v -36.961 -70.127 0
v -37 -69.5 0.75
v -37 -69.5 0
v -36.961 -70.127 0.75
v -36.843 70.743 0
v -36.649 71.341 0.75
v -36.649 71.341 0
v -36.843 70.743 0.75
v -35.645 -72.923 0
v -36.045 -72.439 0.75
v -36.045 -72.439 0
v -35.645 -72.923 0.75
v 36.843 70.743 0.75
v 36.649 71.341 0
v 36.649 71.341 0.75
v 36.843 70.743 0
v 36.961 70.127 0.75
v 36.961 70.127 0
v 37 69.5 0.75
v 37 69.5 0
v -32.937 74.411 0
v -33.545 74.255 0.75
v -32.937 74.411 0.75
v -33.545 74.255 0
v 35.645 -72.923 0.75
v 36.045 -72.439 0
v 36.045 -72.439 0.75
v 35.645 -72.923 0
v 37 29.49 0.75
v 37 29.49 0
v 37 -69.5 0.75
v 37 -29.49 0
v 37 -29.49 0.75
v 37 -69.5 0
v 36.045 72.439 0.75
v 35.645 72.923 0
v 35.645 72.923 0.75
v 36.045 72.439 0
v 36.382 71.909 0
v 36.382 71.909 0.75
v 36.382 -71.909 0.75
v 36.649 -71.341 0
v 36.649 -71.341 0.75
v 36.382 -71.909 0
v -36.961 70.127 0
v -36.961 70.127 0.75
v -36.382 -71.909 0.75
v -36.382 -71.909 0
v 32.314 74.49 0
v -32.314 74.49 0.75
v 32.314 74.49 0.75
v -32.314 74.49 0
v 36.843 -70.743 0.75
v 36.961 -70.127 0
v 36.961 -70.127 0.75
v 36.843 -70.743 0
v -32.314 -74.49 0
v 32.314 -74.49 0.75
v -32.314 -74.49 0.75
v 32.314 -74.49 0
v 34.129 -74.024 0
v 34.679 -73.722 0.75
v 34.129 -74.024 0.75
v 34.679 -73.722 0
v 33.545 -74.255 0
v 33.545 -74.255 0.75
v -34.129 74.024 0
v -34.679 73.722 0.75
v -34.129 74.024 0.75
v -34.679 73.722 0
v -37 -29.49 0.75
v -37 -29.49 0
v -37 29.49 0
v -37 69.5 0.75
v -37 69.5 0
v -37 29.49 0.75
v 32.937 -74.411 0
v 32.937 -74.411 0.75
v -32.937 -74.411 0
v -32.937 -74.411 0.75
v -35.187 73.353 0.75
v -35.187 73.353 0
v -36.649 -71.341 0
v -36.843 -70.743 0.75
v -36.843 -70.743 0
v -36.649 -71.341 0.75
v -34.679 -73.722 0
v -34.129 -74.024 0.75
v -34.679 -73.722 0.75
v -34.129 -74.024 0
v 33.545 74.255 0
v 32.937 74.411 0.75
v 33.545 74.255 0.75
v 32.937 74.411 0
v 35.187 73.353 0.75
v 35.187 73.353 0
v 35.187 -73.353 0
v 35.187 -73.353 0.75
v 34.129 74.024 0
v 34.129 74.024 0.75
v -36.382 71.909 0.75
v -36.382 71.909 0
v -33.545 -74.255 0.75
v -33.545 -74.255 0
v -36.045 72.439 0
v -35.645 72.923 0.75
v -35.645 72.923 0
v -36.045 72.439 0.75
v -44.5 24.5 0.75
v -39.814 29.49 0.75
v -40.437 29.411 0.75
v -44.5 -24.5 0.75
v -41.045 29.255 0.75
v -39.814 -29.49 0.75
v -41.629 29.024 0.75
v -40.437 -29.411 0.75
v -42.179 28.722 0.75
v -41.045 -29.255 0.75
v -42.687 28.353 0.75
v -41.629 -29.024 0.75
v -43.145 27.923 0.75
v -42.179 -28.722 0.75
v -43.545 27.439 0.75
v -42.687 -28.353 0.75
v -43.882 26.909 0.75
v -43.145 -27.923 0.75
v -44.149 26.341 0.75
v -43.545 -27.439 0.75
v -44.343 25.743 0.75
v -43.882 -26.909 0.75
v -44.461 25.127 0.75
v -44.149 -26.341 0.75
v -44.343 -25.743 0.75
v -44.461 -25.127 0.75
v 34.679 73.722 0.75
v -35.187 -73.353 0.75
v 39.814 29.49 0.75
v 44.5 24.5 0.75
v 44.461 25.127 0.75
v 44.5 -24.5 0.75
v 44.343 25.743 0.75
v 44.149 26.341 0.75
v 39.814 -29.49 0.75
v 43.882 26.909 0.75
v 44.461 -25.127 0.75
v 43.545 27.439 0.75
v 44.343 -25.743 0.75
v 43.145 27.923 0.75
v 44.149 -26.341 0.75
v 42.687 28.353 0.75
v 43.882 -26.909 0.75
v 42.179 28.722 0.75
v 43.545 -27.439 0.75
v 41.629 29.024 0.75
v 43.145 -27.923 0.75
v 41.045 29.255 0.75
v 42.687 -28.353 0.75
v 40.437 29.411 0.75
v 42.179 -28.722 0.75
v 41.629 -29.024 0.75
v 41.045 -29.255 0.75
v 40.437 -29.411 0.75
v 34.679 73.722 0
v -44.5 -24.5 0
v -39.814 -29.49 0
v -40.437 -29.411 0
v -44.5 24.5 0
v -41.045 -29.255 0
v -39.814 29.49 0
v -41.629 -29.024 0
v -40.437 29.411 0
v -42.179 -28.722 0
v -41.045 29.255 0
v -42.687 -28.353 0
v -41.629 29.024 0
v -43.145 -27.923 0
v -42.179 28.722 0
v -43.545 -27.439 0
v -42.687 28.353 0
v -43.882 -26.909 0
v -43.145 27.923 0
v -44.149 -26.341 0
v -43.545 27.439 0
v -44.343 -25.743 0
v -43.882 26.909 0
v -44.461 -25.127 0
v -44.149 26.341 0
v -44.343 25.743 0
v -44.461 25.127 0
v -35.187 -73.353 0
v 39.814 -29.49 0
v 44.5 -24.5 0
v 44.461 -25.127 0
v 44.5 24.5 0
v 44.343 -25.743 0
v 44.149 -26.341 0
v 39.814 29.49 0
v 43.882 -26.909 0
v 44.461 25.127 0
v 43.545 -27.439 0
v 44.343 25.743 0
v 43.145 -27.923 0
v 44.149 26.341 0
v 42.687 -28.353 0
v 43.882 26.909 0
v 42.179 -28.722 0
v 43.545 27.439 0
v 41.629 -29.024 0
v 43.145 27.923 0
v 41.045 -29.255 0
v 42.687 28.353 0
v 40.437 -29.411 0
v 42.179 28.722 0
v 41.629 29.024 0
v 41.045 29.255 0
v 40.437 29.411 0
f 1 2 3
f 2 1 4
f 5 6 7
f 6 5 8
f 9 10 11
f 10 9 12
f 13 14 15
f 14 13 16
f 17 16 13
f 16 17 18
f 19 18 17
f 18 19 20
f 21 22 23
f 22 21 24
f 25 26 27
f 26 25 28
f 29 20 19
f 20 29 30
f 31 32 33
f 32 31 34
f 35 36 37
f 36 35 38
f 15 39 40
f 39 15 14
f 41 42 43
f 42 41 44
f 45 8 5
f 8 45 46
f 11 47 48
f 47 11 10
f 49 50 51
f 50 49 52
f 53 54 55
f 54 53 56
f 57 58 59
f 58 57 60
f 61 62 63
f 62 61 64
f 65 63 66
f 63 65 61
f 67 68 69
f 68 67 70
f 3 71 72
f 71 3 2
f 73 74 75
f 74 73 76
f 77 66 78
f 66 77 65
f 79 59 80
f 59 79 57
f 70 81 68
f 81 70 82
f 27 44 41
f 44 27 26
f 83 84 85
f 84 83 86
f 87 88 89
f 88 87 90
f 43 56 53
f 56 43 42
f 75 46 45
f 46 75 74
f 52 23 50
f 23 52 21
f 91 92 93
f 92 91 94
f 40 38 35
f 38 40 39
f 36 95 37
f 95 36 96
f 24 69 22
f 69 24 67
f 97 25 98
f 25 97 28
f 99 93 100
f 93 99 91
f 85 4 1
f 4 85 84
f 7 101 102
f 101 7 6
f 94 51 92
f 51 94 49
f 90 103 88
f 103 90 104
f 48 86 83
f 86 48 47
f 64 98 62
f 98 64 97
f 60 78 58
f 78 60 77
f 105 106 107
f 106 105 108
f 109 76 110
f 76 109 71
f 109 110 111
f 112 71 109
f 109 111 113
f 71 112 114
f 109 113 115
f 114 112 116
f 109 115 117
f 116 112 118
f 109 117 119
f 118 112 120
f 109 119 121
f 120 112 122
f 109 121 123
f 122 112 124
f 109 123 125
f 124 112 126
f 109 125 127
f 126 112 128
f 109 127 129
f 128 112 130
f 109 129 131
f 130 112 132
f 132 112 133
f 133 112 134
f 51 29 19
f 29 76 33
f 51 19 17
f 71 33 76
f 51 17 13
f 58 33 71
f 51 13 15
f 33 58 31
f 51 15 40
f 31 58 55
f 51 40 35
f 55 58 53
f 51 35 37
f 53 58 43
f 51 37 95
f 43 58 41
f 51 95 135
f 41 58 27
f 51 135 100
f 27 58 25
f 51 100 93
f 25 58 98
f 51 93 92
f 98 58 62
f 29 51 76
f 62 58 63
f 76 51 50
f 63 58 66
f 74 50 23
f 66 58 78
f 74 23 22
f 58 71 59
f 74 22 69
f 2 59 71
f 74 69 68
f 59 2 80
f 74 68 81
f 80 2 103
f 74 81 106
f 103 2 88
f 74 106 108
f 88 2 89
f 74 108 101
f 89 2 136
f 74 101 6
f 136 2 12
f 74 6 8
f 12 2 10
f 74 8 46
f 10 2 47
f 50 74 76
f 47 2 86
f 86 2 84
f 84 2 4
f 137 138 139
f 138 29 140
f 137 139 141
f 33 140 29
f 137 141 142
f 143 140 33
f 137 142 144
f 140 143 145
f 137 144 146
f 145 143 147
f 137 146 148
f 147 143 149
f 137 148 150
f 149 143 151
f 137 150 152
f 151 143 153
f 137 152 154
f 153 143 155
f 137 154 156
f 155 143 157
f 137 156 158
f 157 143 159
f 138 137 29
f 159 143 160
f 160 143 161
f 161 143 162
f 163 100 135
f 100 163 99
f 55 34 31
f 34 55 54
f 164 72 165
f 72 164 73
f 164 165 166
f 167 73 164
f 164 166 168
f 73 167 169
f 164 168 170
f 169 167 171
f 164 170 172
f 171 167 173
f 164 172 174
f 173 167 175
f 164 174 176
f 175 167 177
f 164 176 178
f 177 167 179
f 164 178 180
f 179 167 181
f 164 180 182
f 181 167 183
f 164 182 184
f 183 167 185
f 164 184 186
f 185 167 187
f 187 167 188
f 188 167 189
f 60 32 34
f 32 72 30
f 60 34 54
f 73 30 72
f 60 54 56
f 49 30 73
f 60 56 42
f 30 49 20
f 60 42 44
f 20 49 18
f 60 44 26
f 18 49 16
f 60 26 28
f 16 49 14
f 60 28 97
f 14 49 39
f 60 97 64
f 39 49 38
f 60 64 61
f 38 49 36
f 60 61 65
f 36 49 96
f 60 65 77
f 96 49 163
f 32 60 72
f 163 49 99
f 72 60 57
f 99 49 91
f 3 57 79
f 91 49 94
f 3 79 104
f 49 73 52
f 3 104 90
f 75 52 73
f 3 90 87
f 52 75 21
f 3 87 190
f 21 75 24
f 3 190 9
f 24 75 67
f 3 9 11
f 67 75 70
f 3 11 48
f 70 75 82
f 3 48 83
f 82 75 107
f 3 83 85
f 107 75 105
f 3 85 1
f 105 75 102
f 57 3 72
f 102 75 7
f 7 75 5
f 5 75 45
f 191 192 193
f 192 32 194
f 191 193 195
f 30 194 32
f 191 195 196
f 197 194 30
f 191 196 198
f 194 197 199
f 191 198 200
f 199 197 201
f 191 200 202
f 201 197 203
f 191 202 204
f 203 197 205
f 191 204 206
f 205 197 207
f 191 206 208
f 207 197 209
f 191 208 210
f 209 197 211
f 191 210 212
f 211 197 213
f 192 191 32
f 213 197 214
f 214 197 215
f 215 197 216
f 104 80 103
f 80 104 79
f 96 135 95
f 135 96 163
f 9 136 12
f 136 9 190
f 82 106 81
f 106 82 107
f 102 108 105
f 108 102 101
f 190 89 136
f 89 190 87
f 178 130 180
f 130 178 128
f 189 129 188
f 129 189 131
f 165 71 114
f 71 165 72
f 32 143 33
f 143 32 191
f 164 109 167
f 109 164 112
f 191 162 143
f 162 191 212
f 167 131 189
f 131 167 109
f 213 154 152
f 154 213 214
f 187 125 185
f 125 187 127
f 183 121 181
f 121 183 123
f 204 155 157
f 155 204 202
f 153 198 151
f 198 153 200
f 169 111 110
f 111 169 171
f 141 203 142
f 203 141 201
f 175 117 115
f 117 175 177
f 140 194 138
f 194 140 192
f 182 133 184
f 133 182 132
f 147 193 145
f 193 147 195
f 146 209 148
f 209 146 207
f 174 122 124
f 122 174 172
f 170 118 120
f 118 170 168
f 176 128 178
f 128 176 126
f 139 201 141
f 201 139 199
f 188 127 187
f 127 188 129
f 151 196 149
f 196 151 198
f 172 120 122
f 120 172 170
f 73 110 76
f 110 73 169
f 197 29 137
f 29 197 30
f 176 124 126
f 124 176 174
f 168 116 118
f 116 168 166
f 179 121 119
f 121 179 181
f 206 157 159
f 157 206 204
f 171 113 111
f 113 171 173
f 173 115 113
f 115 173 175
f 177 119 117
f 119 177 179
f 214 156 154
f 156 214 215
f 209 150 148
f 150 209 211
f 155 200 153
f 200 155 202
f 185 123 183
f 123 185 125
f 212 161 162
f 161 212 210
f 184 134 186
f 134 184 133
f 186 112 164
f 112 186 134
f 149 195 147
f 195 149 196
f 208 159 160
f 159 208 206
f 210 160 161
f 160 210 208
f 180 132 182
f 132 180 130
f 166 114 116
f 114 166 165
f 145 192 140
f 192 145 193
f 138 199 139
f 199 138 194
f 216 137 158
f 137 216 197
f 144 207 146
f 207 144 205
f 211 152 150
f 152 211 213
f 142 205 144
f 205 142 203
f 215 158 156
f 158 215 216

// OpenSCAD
$fn = 50;


difference() {
	union() {
		hull() {
			translate(v = [-32.0000000000, 69.5000000000, 0]) {
				cylinder(h = 0.7500000000, r = 5);
			}
			translate(v = [32.0000000000, 69.5000000000, 0]) {
				cylinder(h = 0.7500000000, r = 5);
			}
			translate(v = [-32.0000000000, -69.5000000000, 0]) {
				cylinder(h = 0.7500000000, r = 5);
			}
			translate(v = [32.0000000000, -69.5000000000, 0]) {
				cylinder(h = 0.7500000000, r = 5);
			}
		}
		hull() {
			translate(v = [-39.5000000000, 24.5000000000, 0]) {
				cylinder(h = 0.7500000000, r = 5);
			}
			translate(v = [39.5000000000, 24.5000000000, 0]) {
				cylinder(h = 0.7500000000, r = 5);
			}
			translate(v = [-39.5000000000, -24.5000000000, 0]) {
				cylinder(h = 0.7500000000, r = 5);
			}
			translate(v = [39.5000000000, -24.5000000000, 0]) {
				cylinder(h = 0.7500000000, r = 5);
			}
		}
	}
	union();
}
